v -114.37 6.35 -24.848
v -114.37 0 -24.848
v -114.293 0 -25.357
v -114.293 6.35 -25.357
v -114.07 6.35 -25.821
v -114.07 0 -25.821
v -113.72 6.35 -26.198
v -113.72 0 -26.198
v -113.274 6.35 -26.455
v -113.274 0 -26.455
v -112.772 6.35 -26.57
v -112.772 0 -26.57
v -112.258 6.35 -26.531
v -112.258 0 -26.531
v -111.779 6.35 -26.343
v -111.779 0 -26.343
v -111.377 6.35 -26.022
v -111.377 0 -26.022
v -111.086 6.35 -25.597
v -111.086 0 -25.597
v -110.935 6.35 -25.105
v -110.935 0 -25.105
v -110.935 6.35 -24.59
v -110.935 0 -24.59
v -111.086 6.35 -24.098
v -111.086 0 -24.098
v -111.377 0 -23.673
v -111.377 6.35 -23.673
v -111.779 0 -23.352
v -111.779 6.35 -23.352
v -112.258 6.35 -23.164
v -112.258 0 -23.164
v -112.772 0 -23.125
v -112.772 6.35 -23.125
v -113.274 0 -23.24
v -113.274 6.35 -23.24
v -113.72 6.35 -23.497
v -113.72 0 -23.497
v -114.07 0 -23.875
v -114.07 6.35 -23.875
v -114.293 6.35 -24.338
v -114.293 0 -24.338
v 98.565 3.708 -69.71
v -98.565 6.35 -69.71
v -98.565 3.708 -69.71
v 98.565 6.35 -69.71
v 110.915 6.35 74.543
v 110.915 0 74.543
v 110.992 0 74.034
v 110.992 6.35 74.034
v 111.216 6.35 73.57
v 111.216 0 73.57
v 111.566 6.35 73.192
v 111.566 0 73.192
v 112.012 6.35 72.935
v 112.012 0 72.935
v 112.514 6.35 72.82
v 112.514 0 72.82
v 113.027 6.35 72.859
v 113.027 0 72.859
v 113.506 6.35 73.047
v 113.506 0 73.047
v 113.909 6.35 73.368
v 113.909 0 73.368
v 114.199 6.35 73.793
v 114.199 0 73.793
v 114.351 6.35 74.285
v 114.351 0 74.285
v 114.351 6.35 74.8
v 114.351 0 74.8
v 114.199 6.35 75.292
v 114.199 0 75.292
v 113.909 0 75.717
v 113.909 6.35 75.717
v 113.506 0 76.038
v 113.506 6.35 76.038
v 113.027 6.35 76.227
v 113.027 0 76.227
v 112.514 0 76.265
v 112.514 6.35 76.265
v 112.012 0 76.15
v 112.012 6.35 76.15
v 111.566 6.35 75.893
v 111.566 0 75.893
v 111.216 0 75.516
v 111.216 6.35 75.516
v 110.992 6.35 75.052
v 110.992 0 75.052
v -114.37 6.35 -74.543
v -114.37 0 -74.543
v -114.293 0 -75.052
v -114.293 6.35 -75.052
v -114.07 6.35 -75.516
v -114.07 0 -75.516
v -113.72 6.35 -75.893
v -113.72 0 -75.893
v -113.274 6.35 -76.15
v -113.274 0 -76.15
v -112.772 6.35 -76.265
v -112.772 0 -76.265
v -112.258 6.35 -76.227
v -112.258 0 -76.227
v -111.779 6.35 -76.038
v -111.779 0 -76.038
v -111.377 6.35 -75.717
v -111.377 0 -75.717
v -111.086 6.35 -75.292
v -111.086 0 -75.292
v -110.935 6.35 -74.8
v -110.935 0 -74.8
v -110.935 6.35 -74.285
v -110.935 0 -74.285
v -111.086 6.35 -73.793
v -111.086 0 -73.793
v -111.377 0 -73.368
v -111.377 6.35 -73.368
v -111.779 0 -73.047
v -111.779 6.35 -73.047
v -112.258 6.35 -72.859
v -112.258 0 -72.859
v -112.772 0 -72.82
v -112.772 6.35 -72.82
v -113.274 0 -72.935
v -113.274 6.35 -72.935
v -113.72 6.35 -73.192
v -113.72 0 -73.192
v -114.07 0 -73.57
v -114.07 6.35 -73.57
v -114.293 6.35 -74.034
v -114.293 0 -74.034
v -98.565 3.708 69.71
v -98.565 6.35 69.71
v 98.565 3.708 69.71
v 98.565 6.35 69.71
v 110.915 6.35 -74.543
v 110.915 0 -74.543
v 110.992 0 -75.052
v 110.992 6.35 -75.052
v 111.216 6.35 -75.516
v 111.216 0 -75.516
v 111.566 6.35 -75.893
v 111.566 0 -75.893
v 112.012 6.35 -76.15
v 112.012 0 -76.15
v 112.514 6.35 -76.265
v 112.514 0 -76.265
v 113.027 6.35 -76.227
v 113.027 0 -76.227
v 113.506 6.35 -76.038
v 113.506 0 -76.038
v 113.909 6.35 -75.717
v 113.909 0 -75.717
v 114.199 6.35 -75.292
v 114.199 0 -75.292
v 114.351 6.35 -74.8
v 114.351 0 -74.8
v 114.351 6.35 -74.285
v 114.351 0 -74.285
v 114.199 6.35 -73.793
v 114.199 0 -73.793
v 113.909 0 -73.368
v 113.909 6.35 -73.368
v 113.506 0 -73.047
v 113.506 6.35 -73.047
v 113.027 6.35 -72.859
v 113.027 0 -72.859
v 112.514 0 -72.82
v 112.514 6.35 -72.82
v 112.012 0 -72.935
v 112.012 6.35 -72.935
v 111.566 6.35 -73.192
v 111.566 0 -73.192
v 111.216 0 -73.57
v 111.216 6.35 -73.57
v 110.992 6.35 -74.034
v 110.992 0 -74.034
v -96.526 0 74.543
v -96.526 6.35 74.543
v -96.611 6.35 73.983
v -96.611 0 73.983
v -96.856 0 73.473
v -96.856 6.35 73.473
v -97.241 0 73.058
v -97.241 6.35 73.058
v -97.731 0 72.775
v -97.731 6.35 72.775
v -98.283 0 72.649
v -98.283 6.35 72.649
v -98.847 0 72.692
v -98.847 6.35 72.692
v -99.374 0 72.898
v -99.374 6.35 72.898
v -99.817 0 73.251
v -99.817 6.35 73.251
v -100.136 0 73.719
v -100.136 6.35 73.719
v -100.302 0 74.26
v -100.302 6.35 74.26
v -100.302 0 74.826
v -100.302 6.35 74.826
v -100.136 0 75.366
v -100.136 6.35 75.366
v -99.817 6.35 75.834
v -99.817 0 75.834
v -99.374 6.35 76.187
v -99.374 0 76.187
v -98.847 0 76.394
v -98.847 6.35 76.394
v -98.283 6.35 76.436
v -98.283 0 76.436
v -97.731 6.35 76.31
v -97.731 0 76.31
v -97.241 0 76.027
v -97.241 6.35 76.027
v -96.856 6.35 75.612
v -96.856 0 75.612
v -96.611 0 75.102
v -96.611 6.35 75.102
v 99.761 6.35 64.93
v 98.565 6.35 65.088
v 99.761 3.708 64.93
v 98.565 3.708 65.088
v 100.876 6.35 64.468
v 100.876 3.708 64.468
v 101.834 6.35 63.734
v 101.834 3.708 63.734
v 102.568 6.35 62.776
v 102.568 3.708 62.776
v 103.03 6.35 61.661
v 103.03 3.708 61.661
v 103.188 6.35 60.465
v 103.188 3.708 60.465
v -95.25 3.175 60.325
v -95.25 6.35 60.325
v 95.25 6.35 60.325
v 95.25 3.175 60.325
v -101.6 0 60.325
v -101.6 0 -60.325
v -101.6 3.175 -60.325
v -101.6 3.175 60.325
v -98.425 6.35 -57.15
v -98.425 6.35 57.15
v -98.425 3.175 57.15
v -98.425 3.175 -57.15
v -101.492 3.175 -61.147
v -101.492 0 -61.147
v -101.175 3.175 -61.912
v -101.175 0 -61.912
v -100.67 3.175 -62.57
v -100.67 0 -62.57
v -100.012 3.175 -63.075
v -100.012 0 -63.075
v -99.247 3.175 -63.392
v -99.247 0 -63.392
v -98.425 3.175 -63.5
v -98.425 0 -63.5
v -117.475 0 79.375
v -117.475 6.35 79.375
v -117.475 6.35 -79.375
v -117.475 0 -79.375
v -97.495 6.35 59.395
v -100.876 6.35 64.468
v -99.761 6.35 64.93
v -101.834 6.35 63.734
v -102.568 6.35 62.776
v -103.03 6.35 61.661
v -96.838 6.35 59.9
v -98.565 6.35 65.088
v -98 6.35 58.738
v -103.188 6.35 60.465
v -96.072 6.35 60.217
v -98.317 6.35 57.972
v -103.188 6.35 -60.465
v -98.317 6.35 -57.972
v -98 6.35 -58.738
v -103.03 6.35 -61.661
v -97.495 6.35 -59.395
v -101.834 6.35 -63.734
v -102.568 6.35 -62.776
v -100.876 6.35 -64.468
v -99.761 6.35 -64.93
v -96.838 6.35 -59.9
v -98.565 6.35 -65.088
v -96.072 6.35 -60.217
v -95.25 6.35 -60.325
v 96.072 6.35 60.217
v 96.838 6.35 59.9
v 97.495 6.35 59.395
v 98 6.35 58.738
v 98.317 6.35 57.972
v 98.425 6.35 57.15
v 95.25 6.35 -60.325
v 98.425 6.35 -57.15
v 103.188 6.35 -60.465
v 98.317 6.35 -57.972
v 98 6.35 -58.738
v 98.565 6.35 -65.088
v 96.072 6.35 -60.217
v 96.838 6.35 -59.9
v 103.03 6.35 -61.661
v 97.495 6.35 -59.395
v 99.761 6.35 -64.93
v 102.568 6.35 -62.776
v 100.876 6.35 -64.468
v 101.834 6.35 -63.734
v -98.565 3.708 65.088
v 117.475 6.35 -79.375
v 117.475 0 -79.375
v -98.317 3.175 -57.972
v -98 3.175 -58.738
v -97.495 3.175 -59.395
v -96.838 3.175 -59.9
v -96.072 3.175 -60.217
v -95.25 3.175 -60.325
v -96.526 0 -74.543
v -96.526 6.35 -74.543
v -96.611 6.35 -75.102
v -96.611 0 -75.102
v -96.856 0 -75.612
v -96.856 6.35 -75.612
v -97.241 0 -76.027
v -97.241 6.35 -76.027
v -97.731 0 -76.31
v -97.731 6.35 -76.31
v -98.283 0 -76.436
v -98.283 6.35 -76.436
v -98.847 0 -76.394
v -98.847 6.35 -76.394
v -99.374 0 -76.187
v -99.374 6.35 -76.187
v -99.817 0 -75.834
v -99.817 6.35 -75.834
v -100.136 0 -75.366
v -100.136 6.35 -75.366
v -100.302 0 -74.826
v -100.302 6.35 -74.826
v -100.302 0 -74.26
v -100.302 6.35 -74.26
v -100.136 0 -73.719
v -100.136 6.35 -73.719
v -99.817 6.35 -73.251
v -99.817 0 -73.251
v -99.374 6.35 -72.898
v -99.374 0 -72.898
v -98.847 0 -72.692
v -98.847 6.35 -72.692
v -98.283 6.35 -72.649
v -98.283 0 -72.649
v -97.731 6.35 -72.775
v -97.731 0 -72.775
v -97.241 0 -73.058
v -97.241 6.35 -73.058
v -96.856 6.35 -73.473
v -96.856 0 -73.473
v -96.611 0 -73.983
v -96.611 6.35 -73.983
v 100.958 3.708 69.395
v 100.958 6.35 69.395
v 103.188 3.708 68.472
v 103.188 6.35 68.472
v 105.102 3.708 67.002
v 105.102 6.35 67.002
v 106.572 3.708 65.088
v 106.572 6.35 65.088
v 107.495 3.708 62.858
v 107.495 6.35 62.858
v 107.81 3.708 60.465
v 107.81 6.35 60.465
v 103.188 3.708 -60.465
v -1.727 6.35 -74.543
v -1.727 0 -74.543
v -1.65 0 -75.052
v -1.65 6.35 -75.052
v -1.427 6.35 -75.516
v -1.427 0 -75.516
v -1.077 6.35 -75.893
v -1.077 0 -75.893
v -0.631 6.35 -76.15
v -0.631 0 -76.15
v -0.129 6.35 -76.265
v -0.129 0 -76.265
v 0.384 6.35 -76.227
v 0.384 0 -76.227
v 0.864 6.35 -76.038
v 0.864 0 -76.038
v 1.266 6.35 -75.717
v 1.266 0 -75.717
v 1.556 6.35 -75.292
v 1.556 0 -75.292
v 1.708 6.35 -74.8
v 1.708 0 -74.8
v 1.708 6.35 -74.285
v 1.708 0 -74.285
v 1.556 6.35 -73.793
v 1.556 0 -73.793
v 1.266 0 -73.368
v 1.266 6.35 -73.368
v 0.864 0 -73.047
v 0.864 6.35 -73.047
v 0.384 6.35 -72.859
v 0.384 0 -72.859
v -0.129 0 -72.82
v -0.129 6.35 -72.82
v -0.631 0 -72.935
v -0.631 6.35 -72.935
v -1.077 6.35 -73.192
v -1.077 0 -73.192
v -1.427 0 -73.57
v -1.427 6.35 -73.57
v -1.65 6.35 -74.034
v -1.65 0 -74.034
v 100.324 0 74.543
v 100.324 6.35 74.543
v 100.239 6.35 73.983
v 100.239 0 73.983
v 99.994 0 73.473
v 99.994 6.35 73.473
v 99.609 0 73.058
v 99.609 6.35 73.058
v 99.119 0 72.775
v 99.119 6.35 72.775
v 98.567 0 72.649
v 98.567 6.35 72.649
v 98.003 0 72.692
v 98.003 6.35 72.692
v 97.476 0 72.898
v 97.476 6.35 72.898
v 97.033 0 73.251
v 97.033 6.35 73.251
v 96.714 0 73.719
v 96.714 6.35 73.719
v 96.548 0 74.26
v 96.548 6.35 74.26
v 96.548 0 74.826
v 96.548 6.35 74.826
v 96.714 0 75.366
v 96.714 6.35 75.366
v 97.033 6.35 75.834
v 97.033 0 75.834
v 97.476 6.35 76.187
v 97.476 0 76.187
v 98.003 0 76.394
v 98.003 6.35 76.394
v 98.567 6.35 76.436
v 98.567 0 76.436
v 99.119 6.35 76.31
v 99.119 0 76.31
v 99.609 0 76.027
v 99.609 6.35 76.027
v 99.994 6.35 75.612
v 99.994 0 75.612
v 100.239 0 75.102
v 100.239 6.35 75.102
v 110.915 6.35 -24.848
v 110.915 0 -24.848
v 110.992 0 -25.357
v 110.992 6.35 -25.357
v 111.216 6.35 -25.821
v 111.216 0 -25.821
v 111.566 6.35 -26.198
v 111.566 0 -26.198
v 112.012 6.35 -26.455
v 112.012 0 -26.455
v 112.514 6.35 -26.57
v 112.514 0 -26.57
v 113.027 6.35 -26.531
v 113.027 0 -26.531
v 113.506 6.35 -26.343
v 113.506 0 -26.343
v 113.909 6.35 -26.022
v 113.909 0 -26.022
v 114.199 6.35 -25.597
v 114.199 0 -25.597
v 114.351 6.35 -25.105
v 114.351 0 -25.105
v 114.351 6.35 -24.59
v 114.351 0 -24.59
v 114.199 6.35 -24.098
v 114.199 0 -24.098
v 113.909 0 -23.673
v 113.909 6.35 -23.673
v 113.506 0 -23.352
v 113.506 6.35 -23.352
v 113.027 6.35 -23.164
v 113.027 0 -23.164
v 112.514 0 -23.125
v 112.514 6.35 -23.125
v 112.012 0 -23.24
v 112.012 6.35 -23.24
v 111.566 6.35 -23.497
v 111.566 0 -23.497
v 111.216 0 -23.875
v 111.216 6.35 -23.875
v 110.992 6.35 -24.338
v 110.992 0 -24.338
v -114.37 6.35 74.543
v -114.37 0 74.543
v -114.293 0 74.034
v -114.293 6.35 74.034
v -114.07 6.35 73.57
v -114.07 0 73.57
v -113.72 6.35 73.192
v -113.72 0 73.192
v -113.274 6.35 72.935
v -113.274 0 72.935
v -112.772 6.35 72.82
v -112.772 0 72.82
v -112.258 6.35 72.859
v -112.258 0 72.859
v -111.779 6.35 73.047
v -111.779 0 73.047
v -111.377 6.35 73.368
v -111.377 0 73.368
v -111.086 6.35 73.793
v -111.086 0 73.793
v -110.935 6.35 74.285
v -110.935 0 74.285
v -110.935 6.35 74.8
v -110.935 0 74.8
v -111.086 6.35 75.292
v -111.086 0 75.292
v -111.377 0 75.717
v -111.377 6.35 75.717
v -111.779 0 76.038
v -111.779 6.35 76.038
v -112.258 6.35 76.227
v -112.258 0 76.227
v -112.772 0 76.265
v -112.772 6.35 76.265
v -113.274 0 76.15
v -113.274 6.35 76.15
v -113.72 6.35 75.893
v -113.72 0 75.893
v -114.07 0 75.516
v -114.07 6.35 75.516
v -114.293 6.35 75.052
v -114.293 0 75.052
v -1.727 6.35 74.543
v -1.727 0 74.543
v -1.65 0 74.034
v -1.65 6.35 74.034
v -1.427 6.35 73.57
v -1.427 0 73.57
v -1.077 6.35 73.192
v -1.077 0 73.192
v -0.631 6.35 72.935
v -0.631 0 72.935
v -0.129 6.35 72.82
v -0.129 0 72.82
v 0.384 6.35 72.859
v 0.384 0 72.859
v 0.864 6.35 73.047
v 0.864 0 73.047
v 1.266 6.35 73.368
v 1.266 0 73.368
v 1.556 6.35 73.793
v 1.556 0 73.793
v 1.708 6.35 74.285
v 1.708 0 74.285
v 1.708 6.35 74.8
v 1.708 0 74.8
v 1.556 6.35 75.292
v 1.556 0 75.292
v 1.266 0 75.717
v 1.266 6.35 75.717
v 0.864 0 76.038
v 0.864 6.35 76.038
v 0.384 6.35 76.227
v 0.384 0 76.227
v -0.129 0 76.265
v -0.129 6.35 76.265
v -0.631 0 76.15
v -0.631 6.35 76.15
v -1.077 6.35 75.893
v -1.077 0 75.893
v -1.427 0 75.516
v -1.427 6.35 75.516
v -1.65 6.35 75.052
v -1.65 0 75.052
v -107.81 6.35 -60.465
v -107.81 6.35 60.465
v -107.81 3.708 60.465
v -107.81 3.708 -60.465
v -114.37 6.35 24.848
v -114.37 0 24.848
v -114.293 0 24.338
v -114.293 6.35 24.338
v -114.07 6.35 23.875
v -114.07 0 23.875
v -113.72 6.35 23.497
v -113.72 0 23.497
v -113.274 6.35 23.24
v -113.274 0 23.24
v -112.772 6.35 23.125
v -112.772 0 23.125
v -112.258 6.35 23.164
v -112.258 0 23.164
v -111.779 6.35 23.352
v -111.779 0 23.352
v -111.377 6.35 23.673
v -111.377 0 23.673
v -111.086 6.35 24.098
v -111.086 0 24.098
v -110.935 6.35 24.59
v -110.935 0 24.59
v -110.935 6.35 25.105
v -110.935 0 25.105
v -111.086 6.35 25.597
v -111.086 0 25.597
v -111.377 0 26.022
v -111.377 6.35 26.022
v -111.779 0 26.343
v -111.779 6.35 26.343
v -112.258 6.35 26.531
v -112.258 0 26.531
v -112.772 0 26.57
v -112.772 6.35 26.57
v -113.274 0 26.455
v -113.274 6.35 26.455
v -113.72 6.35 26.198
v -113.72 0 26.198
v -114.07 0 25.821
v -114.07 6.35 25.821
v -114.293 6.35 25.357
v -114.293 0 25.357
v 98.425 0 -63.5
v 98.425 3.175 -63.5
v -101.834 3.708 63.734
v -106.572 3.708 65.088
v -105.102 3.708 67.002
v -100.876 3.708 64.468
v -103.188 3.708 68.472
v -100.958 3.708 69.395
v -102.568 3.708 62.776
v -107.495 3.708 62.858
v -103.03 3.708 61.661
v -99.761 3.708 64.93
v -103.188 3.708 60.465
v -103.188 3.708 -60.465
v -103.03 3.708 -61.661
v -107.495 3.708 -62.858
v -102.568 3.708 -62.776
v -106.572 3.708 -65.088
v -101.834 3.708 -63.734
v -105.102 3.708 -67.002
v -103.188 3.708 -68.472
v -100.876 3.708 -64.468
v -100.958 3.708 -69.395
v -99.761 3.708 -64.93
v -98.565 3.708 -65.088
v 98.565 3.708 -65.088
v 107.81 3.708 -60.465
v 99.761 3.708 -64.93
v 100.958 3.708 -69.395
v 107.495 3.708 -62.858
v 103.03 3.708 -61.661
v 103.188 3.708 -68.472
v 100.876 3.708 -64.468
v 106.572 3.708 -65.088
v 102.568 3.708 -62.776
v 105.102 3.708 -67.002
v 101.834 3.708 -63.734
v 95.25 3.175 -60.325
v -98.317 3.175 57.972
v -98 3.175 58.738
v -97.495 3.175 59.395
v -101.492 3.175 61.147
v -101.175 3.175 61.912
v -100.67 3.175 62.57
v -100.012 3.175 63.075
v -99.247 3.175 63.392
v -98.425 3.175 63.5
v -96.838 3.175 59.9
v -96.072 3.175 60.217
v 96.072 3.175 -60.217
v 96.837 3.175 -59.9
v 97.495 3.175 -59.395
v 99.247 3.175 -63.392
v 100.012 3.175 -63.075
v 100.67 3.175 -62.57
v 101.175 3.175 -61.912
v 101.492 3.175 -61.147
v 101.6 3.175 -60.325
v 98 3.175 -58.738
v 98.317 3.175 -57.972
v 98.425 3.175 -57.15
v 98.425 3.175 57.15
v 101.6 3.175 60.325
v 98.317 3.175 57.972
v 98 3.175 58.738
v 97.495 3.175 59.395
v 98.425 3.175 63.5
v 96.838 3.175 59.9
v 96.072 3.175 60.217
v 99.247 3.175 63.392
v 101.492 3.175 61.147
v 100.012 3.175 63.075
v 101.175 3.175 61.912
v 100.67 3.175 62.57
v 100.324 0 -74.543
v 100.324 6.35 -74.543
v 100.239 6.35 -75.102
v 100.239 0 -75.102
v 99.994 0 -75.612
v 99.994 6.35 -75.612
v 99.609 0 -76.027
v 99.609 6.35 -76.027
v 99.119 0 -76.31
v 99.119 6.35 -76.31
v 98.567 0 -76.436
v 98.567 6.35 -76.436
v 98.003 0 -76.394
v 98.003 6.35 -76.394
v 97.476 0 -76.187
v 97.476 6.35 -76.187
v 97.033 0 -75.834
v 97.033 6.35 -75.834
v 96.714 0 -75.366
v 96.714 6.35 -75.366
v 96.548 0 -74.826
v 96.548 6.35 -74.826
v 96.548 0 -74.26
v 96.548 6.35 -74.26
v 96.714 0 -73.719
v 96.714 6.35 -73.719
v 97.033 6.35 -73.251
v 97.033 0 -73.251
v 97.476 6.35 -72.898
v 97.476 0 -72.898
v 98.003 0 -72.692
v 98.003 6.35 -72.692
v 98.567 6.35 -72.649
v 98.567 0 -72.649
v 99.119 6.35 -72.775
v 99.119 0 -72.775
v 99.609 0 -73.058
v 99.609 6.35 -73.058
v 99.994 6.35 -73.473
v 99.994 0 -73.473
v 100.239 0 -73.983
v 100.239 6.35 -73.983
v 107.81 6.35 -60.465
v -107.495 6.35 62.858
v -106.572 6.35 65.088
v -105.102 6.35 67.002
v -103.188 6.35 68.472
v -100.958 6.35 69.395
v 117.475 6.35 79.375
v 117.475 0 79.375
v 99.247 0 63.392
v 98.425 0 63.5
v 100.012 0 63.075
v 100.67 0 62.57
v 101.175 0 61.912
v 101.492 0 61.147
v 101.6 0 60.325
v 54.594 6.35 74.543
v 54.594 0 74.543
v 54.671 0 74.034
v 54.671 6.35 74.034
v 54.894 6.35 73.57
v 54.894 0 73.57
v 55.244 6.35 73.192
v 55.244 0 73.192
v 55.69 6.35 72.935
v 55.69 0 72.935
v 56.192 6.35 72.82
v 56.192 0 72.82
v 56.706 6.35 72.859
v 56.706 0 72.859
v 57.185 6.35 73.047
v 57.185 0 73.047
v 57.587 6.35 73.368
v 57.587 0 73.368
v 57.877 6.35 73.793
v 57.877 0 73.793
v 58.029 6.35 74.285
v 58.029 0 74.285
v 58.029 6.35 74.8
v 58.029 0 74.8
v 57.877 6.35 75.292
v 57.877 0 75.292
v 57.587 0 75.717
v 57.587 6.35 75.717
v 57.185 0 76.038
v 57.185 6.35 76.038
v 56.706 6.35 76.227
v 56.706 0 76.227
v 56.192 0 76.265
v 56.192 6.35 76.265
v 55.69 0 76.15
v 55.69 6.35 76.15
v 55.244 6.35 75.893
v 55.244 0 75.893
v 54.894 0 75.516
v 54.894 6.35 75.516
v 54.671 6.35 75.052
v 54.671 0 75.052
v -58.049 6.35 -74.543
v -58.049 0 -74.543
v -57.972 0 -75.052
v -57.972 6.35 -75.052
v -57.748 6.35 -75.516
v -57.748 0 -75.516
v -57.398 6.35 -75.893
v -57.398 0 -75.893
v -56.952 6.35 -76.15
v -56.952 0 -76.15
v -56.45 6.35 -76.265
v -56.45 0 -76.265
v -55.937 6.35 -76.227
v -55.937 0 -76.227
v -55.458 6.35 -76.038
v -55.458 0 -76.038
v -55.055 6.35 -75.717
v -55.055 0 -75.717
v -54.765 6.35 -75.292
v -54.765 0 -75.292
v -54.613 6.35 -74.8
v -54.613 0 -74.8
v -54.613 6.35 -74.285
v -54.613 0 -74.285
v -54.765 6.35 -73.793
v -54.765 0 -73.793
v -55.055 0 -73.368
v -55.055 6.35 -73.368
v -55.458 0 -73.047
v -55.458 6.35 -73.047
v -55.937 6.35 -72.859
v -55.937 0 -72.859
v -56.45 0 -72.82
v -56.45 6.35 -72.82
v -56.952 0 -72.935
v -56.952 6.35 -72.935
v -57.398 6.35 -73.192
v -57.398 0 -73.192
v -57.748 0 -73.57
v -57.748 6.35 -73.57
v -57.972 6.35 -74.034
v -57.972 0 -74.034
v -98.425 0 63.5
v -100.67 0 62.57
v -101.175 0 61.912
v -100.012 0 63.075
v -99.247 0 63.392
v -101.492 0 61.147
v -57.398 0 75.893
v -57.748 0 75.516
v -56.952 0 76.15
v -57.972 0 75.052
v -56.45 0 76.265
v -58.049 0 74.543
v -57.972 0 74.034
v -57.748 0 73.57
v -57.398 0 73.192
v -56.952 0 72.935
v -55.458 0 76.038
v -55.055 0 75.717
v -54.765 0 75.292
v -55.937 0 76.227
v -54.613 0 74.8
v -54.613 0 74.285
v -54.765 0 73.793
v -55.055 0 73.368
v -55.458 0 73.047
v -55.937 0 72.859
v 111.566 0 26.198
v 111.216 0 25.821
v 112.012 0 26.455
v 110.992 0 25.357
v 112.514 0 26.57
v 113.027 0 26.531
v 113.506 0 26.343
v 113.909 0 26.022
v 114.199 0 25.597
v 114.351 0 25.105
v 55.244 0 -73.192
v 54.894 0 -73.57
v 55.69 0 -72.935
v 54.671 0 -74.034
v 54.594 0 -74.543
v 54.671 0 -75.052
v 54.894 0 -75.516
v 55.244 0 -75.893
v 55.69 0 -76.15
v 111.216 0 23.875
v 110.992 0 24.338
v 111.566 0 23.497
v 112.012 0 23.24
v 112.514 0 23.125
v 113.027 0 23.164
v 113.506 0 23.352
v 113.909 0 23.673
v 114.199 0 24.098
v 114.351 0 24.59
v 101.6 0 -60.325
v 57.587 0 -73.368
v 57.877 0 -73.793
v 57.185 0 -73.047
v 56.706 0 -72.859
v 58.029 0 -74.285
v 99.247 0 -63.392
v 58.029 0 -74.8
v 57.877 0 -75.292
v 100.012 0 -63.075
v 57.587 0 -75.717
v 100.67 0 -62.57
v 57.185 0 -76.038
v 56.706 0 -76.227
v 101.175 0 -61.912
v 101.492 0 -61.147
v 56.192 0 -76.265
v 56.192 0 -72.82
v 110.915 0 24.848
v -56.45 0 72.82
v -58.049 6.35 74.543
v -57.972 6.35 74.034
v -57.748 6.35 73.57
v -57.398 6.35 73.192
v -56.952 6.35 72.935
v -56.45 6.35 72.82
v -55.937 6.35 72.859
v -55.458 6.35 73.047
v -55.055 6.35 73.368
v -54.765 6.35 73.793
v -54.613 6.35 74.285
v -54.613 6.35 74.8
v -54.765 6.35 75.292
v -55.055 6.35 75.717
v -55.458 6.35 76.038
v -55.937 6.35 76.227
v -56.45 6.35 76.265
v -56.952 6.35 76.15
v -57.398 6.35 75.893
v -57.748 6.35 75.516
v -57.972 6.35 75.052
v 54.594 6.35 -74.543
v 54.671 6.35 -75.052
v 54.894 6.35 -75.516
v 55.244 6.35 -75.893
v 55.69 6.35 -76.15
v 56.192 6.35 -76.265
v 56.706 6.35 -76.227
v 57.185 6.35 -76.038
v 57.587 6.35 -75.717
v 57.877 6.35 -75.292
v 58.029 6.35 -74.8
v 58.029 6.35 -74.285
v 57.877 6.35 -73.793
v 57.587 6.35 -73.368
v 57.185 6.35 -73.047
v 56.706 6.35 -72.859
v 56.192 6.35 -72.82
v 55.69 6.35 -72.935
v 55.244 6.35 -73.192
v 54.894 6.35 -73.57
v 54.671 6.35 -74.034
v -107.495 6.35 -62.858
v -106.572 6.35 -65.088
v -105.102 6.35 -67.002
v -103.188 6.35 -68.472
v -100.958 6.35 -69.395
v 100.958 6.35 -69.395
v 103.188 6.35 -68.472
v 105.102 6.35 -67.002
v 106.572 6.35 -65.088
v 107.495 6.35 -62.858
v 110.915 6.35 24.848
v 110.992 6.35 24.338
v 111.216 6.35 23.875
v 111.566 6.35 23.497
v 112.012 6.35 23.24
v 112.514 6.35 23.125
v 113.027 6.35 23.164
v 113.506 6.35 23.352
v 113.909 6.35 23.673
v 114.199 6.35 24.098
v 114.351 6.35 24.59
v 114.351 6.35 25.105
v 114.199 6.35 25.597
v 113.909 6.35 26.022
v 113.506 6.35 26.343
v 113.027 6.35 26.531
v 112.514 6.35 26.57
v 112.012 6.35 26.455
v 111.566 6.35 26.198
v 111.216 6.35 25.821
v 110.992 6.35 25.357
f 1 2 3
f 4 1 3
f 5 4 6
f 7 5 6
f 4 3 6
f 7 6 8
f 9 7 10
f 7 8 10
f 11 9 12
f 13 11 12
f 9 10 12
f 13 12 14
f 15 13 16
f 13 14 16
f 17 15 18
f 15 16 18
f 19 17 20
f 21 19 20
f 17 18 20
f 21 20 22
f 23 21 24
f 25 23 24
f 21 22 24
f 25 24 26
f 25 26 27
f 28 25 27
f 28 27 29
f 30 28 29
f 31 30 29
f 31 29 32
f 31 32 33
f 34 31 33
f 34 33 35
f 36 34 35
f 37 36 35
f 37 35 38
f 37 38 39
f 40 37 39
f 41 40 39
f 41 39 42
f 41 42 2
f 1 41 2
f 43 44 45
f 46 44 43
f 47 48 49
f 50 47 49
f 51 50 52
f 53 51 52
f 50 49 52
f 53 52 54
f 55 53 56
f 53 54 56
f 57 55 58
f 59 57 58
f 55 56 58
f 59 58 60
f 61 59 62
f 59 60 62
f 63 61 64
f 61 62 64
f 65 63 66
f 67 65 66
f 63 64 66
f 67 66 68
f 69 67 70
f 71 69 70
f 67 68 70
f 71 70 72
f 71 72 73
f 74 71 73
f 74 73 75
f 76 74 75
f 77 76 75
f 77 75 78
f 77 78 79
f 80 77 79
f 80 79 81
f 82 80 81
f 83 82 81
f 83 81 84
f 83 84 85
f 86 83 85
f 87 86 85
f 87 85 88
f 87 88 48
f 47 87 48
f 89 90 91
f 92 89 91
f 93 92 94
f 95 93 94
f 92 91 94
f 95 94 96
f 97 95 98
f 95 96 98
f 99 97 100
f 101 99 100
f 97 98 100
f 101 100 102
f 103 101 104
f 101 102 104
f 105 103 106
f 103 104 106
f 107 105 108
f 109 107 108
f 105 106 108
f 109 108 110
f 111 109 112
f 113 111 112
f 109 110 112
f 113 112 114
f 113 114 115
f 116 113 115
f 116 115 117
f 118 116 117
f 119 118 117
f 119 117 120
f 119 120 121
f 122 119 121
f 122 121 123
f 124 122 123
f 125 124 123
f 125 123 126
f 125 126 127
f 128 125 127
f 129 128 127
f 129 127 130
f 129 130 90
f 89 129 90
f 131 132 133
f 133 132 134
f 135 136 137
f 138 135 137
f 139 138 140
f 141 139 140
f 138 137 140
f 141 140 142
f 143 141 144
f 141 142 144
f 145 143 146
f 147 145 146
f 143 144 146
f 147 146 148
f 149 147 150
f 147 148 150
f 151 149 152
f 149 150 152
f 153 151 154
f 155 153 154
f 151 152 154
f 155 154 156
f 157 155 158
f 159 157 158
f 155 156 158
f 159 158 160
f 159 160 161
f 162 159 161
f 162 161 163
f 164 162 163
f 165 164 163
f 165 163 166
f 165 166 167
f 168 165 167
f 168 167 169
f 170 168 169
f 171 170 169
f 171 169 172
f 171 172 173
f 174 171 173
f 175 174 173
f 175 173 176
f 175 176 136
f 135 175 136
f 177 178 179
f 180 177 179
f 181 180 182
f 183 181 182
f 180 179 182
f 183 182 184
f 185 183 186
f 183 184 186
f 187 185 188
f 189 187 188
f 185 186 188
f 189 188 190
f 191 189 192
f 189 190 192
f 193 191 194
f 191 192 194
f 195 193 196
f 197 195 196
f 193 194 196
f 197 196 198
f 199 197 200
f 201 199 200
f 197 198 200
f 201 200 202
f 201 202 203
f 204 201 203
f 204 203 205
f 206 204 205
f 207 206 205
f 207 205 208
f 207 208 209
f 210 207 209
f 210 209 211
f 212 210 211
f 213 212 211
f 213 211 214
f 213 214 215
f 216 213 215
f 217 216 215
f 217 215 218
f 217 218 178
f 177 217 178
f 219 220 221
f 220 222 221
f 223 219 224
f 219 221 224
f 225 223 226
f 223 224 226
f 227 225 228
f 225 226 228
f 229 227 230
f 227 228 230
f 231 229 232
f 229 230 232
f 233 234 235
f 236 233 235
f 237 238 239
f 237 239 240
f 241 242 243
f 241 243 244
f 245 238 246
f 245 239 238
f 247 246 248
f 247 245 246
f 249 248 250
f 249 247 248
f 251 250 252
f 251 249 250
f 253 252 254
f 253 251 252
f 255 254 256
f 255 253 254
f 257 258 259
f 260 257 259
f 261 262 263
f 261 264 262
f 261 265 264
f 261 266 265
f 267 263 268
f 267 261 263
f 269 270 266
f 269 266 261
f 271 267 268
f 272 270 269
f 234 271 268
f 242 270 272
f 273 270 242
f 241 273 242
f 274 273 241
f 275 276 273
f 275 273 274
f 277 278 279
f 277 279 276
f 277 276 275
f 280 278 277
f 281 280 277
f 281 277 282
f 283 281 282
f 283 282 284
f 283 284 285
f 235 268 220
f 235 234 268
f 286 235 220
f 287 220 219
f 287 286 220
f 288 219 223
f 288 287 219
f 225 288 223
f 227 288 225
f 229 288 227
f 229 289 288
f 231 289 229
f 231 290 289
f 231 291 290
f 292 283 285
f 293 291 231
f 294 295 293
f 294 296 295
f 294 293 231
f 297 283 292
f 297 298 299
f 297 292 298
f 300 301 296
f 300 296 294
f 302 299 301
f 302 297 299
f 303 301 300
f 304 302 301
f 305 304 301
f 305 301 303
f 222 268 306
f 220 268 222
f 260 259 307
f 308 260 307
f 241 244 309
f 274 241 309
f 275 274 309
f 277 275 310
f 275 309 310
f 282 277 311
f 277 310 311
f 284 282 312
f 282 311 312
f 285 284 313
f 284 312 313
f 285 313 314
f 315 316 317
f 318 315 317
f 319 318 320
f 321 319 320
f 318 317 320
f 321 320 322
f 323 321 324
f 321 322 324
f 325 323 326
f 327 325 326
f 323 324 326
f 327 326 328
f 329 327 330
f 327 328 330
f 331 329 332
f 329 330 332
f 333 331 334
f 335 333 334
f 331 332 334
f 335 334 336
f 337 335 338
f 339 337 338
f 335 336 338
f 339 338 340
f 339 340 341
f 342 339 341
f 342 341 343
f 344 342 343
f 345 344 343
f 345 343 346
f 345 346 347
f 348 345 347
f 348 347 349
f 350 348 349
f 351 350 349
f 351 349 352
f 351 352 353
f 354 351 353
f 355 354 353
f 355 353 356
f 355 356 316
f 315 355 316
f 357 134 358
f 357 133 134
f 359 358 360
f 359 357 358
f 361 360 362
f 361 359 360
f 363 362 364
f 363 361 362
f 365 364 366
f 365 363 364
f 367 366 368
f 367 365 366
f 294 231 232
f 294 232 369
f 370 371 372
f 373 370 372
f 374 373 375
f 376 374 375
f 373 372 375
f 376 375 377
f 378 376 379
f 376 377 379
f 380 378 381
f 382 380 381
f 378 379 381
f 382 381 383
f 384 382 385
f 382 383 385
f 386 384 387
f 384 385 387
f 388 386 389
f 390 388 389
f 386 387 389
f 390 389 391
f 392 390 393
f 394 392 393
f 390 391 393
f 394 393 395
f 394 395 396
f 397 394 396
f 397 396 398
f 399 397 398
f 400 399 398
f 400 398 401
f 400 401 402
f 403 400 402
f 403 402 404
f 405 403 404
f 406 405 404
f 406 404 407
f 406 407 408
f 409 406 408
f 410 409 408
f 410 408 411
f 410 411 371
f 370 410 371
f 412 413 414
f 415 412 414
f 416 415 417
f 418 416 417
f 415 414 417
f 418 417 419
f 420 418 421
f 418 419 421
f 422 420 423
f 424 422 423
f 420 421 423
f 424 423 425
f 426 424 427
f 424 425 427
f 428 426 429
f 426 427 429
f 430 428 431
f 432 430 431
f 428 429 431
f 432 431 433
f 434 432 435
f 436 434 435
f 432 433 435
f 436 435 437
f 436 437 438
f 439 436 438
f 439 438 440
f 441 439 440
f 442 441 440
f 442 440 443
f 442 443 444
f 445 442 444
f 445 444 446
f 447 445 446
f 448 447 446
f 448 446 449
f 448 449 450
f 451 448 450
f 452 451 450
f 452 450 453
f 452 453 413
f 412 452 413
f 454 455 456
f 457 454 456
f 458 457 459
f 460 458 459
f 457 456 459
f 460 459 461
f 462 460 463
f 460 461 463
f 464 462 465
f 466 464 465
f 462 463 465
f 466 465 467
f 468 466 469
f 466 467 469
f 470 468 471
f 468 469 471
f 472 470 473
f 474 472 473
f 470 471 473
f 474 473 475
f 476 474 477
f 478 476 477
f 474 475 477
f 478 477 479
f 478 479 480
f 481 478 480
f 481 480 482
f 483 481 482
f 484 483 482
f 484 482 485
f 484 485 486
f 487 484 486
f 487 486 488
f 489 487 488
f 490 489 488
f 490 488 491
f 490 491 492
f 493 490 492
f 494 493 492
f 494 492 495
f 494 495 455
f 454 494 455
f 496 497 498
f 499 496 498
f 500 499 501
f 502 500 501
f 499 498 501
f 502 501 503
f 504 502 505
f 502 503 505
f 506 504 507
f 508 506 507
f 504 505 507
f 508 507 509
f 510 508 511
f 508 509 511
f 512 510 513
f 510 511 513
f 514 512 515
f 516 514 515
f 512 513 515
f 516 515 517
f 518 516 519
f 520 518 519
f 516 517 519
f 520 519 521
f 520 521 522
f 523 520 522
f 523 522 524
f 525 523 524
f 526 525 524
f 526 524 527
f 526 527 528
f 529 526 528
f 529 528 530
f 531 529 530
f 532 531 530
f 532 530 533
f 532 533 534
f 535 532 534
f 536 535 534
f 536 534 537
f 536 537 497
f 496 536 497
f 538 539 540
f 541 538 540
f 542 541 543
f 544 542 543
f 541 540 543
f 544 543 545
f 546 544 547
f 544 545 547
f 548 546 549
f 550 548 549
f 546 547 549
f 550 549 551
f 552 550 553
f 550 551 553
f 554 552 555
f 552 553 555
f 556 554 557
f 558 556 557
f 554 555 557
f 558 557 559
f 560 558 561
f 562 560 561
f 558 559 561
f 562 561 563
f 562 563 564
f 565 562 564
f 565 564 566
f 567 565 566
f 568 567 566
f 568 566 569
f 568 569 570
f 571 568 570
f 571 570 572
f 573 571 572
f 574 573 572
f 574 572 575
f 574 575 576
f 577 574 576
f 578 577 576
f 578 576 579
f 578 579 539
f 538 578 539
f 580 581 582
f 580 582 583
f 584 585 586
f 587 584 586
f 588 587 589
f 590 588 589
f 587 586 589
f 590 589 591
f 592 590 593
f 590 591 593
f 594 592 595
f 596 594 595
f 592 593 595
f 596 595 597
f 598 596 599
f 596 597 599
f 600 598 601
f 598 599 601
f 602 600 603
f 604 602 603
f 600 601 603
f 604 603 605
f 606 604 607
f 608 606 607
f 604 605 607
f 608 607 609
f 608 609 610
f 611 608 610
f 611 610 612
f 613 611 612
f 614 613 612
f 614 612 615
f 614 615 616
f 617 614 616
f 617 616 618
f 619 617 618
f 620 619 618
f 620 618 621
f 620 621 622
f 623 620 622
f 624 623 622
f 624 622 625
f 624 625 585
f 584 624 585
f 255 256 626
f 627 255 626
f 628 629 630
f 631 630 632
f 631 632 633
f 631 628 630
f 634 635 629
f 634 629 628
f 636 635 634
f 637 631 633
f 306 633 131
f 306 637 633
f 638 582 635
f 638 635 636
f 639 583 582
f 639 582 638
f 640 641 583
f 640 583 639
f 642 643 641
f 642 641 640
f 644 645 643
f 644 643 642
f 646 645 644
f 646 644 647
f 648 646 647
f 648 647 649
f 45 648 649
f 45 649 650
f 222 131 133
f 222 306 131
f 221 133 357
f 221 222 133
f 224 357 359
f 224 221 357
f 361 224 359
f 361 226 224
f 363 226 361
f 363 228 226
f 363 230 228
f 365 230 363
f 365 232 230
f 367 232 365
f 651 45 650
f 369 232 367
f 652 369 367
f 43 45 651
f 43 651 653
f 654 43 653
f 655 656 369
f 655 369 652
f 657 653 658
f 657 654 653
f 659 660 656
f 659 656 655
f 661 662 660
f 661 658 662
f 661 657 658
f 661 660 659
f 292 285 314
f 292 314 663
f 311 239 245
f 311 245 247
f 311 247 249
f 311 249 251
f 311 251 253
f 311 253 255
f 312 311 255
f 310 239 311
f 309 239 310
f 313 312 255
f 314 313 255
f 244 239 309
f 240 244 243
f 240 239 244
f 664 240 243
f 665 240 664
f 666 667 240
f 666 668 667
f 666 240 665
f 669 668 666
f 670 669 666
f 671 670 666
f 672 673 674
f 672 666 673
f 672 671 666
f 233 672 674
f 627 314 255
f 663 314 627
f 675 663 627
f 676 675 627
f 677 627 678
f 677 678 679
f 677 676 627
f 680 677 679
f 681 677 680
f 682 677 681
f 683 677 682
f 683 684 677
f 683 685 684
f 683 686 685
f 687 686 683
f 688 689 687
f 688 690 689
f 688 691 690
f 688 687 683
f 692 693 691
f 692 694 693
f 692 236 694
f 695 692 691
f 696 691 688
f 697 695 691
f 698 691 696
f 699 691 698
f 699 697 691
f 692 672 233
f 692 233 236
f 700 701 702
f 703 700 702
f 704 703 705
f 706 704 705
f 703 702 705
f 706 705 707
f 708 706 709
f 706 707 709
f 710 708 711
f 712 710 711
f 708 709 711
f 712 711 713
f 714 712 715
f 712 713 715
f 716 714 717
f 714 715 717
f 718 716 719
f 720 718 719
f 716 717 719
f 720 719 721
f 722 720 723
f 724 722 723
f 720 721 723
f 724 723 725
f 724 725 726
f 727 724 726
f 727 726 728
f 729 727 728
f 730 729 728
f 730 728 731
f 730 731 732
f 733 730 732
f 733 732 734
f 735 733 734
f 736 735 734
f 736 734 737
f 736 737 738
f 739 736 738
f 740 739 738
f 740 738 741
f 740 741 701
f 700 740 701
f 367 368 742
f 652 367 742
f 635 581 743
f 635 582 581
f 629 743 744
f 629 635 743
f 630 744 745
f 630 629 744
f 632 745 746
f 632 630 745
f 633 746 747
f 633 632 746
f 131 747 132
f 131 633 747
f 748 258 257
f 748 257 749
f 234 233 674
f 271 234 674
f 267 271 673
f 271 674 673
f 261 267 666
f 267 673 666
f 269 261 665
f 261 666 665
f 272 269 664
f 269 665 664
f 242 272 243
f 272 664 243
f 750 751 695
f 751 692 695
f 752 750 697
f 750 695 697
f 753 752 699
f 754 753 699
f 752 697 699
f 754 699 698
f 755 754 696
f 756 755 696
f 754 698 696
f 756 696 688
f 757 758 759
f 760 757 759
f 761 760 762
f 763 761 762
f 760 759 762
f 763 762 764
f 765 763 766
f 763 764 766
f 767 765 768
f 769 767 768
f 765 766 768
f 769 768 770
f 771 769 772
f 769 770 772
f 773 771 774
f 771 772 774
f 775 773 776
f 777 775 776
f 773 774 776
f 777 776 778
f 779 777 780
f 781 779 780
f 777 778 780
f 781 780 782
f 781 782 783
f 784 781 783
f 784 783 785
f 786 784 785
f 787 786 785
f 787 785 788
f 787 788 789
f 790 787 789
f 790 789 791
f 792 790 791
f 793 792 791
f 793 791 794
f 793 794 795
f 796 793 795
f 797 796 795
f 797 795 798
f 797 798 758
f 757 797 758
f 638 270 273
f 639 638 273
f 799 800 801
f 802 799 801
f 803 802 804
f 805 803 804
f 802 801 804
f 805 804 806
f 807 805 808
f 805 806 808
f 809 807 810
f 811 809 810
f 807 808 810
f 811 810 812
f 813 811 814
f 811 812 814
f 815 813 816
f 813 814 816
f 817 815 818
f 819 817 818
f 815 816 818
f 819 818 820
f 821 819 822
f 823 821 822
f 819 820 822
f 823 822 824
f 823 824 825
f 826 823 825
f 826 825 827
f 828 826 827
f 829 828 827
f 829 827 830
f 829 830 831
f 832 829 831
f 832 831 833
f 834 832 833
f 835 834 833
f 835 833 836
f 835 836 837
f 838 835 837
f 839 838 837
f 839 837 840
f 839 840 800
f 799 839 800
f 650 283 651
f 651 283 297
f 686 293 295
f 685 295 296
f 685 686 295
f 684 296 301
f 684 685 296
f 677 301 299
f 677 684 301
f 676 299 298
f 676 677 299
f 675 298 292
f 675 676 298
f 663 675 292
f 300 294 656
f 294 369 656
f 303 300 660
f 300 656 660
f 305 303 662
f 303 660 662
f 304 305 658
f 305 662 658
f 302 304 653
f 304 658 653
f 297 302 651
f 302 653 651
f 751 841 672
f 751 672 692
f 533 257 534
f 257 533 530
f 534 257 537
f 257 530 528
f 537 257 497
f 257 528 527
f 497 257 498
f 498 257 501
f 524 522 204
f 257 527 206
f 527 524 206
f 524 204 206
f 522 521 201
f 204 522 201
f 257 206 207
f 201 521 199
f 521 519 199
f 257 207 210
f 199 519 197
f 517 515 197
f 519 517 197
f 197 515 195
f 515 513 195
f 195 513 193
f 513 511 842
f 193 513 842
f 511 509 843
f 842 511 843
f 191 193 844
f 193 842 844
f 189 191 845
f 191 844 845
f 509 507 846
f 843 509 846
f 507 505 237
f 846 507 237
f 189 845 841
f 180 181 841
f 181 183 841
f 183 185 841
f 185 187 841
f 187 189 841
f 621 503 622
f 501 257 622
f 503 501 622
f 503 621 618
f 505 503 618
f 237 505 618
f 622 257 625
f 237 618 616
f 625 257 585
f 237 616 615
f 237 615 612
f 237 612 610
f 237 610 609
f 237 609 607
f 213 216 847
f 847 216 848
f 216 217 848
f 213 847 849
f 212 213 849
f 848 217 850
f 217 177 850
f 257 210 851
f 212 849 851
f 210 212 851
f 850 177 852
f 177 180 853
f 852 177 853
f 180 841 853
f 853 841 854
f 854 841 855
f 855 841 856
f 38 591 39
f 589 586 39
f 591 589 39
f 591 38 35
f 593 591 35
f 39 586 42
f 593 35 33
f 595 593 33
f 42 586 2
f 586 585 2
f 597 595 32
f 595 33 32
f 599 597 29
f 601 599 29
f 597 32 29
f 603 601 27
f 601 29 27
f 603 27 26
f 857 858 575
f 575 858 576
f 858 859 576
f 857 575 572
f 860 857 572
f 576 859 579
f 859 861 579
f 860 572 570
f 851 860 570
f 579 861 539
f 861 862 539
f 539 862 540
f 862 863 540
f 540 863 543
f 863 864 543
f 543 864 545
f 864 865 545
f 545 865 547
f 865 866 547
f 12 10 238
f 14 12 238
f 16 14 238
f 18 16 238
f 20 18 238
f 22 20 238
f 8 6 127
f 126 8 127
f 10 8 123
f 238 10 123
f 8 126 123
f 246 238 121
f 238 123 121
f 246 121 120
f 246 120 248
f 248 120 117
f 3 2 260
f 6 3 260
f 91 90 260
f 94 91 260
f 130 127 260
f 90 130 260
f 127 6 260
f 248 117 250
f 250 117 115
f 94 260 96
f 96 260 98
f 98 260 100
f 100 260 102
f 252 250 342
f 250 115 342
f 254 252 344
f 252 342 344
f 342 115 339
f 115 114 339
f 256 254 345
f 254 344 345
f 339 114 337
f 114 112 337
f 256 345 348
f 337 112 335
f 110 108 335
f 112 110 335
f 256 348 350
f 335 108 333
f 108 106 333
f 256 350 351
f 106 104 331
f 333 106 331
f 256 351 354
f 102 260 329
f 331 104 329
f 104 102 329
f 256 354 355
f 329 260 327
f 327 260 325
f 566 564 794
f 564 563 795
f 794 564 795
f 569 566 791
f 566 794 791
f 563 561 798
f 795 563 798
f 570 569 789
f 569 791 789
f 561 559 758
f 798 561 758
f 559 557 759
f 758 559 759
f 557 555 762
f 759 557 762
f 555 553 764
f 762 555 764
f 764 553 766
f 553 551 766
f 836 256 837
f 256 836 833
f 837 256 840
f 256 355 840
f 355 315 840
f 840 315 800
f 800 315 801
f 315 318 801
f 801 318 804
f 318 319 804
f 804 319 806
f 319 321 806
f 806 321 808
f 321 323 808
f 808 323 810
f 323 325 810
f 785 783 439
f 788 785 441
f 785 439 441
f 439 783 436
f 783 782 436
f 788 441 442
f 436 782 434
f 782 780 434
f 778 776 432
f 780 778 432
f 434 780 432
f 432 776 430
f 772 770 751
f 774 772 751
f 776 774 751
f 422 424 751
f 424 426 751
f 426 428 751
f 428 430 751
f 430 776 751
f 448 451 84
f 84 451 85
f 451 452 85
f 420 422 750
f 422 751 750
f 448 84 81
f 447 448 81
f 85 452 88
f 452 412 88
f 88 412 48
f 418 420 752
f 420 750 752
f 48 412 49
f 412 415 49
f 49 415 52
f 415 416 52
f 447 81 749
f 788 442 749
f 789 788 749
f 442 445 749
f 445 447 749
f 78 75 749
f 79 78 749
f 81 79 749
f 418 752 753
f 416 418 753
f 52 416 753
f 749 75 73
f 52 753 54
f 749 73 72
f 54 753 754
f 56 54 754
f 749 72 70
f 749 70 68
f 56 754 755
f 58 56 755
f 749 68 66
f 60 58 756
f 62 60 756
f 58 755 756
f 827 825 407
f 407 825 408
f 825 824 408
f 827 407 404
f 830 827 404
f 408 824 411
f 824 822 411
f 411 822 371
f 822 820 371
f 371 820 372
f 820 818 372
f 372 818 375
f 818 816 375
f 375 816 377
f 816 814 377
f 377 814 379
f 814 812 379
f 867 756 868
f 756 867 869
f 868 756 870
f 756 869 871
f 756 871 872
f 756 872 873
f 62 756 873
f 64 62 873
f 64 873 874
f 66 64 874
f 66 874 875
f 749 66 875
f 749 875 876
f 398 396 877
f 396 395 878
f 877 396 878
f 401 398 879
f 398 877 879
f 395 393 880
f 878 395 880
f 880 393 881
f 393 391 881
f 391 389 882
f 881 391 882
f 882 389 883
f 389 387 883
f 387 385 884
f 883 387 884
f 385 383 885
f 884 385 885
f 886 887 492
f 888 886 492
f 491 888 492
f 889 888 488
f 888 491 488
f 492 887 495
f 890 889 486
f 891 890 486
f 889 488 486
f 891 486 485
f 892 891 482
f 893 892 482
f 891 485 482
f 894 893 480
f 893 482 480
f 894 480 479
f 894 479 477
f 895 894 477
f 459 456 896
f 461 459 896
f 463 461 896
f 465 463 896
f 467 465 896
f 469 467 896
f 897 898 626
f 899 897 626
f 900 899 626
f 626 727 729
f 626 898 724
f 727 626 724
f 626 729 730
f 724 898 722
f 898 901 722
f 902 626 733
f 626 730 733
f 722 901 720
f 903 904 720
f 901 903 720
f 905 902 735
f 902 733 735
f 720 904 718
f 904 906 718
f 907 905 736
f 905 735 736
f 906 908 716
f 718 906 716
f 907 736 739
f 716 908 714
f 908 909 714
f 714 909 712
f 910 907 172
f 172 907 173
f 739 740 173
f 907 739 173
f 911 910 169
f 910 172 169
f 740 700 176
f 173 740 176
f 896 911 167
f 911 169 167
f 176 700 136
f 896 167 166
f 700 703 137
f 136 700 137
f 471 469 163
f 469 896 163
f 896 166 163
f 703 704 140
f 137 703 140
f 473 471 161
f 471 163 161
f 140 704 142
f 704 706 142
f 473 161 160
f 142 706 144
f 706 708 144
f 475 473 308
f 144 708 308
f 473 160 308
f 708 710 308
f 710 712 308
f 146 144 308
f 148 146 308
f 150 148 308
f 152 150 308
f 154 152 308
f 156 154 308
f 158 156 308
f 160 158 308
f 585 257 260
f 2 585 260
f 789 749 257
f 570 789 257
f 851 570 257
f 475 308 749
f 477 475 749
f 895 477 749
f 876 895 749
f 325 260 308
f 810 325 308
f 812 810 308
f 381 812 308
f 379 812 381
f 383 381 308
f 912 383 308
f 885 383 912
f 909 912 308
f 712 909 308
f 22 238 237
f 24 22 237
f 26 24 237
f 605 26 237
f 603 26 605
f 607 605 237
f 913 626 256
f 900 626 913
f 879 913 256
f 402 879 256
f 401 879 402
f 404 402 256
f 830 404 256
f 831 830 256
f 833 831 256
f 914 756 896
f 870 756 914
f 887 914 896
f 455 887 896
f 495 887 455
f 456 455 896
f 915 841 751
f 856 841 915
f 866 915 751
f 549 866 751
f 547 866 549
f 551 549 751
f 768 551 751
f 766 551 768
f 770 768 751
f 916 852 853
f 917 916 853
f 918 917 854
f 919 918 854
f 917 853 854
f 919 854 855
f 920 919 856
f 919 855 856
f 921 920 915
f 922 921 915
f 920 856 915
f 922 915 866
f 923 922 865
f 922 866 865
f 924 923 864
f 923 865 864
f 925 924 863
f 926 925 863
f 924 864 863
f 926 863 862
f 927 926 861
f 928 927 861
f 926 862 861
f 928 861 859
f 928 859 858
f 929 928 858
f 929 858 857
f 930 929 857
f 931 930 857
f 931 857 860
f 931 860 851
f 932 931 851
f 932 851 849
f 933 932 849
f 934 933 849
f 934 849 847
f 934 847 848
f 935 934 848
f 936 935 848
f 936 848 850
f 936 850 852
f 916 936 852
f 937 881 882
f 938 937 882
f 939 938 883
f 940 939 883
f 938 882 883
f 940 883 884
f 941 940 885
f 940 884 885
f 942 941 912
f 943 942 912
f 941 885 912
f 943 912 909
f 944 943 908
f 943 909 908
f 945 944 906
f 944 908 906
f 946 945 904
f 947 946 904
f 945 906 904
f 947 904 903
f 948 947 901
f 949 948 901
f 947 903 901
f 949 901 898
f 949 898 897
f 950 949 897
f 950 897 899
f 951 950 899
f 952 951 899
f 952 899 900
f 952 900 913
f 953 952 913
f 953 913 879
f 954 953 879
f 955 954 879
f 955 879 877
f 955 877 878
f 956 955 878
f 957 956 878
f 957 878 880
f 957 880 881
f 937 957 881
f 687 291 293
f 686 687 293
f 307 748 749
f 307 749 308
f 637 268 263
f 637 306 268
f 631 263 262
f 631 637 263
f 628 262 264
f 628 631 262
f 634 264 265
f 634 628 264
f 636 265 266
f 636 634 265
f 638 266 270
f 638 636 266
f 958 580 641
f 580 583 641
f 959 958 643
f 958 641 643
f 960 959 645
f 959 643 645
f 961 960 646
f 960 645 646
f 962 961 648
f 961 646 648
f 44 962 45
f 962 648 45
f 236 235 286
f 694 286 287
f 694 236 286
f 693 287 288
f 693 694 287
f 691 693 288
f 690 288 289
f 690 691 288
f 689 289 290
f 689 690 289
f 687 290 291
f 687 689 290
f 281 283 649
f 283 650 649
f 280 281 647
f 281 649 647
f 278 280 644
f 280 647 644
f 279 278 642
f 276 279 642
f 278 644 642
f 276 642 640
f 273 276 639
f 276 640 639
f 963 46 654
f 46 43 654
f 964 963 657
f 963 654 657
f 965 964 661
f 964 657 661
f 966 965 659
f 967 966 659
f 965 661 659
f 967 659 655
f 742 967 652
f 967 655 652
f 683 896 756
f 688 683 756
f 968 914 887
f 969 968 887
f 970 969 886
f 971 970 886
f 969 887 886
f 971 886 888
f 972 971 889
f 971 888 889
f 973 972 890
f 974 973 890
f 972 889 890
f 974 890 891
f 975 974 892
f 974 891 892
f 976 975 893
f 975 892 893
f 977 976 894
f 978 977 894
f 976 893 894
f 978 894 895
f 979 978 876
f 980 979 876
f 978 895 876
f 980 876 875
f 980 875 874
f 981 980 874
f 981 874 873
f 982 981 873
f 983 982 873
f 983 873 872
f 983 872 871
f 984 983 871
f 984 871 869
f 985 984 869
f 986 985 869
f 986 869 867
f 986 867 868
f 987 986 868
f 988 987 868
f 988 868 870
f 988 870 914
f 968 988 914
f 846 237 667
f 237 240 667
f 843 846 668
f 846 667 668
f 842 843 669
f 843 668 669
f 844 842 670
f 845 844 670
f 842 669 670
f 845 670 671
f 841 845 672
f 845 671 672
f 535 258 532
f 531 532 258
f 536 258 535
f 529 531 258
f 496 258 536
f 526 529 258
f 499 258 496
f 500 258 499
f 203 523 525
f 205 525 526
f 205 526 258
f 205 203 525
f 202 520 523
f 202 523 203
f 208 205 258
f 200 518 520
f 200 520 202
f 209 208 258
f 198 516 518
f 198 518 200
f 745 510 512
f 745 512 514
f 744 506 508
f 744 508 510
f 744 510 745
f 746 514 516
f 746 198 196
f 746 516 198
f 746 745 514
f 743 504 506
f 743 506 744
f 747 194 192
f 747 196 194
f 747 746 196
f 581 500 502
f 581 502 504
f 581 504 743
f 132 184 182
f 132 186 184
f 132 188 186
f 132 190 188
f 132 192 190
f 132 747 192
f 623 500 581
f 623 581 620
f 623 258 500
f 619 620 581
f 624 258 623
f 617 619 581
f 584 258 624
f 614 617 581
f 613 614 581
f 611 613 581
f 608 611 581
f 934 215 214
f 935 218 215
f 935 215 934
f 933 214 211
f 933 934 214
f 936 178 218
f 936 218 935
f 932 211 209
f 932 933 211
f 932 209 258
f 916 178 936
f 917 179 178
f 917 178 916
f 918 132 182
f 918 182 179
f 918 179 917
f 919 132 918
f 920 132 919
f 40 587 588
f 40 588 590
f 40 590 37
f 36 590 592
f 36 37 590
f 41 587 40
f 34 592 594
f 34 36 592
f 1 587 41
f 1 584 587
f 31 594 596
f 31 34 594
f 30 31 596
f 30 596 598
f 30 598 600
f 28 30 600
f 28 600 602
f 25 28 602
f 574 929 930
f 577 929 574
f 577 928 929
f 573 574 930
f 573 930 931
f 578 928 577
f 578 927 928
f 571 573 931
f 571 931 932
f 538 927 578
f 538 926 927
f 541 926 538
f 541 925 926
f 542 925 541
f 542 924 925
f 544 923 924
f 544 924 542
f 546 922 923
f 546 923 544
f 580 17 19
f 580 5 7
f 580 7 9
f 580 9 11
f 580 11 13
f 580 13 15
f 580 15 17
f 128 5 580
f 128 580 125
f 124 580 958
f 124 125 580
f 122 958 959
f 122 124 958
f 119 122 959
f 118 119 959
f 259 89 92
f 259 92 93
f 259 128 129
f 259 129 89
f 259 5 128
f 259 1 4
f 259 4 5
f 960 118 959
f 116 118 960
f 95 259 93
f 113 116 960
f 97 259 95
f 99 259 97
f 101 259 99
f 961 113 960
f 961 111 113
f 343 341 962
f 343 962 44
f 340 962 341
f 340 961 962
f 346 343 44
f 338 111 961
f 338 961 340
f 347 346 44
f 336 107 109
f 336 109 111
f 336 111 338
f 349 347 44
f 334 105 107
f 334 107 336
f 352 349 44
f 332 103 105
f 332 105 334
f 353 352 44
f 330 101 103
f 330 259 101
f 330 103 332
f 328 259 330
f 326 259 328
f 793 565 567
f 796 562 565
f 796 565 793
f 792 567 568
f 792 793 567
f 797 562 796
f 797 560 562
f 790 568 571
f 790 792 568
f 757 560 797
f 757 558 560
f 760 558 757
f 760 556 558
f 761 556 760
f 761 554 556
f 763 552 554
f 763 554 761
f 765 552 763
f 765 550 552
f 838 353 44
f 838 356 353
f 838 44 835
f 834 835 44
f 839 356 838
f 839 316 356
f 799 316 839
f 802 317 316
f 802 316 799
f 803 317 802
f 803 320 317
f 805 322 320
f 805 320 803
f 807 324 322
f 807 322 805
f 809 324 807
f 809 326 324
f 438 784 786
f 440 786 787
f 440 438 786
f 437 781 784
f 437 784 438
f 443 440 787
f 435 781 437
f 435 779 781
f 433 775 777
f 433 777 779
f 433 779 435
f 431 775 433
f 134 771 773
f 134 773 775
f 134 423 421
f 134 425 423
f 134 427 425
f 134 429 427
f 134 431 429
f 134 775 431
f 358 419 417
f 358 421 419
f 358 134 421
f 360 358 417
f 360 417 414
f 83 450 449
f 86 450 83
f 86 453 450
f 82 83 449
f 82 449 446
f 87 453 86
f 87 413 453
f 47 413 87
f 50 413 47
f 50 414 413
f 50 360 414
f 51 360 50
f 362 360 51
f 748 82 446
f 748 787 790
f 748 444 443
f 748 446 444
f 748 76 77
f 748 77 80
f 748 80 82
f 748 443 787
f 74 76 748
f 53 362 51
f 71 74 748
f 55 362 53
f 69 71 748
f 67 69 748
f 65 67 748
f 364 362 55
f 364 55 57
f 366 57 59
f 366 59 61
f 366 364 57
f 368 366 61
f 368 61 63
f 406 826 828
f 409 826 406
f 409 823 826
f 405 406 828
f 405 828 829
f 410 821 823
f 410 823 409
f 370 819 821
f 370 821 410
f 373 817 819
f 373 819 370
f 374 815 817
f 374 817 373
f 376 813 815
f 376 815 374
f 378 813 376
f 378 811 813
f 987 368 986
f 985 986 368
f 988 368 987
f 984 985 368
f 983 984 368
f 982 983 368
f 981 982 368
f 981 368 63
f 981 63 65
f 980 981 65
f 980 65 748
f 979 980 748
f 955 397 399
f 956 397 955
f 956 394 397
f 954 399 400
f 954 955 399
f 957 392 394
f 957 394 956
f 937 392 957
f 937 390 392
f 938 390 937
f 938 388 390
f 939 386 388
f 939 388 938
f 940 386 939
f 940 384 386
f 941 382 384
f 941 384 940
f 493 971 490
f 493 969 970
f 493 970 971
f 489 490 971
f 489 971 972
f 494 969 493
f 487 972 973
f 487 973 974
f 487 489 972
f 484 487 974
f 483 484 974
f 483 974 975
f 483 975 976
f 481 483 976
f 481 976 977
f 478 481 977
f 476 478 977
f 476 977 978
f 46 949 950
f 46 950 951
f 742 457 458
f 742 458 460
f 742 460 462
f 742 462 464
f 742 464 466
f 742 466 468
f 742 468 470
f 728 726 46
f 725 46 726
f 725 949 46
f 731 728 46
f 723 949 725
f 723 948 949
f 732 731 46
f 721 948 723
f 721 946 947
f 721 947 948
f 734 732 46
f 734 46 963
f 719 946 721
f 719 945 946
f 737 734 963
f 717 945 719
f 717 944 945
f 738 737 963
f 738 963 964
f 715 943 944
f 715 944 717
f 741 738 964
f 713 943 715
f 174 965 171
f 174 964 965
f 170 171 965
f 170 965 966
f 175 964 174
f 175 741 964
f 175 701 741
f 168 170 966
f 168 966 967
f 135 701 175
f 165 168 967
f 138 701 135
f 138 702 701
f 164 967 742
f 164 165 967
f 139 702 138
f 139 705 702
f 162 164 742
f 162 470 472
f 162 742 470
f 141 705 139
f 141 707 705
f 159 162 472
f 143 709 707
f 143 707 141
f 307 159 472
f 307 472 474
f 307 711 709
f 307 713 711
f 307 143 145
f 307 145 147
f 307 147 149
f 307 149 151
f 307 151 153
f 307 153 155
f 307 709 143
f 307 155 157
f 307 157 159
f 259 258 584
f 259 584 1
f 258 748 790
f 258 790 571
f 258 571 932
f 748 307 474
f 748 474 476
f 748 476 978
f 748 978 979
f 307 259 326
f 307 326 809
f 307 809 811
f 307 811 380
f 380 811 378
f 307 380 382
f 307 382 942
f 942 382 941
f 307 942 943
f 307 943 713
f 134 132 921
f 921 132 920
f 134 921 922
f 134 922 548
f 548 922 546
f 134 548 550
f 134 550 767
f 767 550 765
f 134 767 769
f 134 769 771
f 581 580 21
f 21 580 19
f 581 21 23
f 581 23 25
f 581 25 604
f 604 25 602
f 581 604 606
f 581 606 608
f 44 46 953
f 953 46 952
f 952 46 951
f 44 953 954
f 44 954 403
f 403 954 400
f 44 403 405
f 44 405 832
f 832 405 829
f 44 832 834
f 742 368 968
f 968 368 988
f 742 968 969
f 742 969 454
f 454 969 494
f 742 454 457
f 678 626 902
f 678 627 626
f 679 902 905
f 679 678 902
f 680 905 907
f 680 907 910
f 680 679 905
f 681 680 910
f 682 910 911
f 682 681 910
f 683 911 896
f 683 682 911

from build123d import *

# Parameters (mm, degrees)
SKETCH1_W             = 203.2
SKETCH1_H             = 127
BOSS_EXTRUDE1_DEPTH   = 6.35
SKETCH2_W             = 196.85
SKETCH2_H             = 120.65
CUT_EXTRUDE1_DEPTH    = 7.35
SKETCH4_W             = 234.95
SKETCH4_H             = 158.75
SKETCH4_W_2           = 203.2
SKETCH4_H_2           = 127
BOSS_EXTRUDE2_DEPTH   = 6.35
SKETCH7_W             = 215.6206
SKETCH7_H             = 139.4206
SKETCH7_W_2           = 206.375
SKETCH7_H_2           = 130.175
CUT_EXTRUDE2_DEPTH    = 2.6416
F_8_32_TAPPED_HOLE1_D = 3.4544
FILLET3_R             = 4.6228
FILLET4_R             = 9.2456
FILLET5_R             = 3.175
F_6_CLEARANCE_HOLE1_D = 3.7973
SKETCH18_W            = 203.2
SKETCH18_H            = 127
CUT_EXTRUDE3_DEPTH    = 3.175
FILLET6_R             = 3.175


with BuildPart() as part:
    # Sketch1 → Boss-Extrude1 (new body)
    with BuildSketch(Plane(origin=(0, 0, 0), x_dir=(1, 0, 0), z_dir=(0, 1, 0))):
        Rectangle(SKETCH1_W, SKETCH1_H)
    extrude(amount=BOSS_EXTRUDE1_DEPTH)

    # Sketch2 → Cut-Extrude1 (cut, through all)
    with BuildSketch(Plane(origin=(0, 6.35, 0), x_dir=(1, 0, 0), z_dir=(0, 1, 0))):
        Rectangle(SKETCH2_W, SKETCH2_H)
    extrude(amount=-CUT_EXTRUDE1_DEPTH, mode=Mode.SUBTRACT)

    # Sketch4 → Boss-Extrude2 (add)
    with BuildSketch(Plane(origin=(0, 6.35, 0), x_dir=(1, 0, 0), z_dir=(0, 1, 0))):
        Rectangle(SKETCH4_W, SKETCH4_H)
        Rectangle(SKETCH4_W_2, SKETCH4_H_2, mode=Mode.SUBTRACT)
    extrude(amount=-BOSS_EXTRUDE2_DEPTH)

    # Sketch7 → Cut-Extrude2 (cut)
    with BuildSketch(Plane(origin=(0, 6.35, 0), x_dir=(1, 0, 0), z_dir=(0, 1, 0))):
        Rectangle(SKETCH7_W, SKETCH7_H)
        Rectangle(SKETCH7_W_2, SKETCH7_H_2, mode=Mode.SUBTRACT)
    extrude(amount=-CUT_EXTRUDE2_DEPTH, mode=Mode.SUBTRACT)

    # #8-32 Tapped Hole1 (through all)
    with Locations(Plane(origin=(0, 6.35, 0), x_dir=(1, 0, 0), z_dir=(0, 1, 0))):
        with Locations((56.321325, 74.54265), (112.64265, 74.54265), (112.64265, 24.84755), (0, 74.54265), (112.64265, -24.84755), (112.64265, -74.54265), (56.321325, -74.54265), (0, -74.54265), (-56.321325, -74.54265), (-112.64265, -74.54265), (-112.64265, -24.84755), (-112.64265, 24.84755), (-112.64265, 74.54265), (-56.321325, 74.54265)):
            Hole(F_8_32_TAPPED_HOLE1_D / 2)

    # Fillet3
    fillet3_edges = [part.edges().sort_by_distance(p)[0] for p in [
        (-103.1875, 5.0292, -65.0875),
        (103.1875, 5.0292, -65.0875),
        (103.1875, 5.0292, 65.0875),
        (-103.1875, 5.0292, 65.0875),
    ]]
    fillet(fillet3_edges, radius=FILLET3_R)

    # Fillet4
    fillet4_edges = [part.edges().sort_by_distance(p)[0] for p in [
        (-107.8103, 5.0292, -69.7103),
        (107.8103, 5.0292, -69.7103),
        (107.8103, 5.0292, 69.7103),
        (-107.8103, 5.0292, 69.7103),
    ]]
    fillet(fillet4_edges, radius=FILLET4_R)

    # Fillet5
    fillet5_edges = [part.edges().sort_by_distance(p)[0] for p in [
        (-98.425, 3.175, -60.325),
        (98.425, 3.175, -60.325),
        (98.425, 3.175, 60.325),
        (-98.425, 3.175, 60.325),
    ]]
    fillet(fillet5_edges, radius=FILLET5_R)

    # #6 Clearance Hole1 (through all)
    with Locations(Plane(origin=(0, 0, 0), x_dir=(-1, 0, 0), z_dir=(0, -1, 0))):
        with Locations((-98.425, 74.54265), (-98.425, -74.54265), (98.425, -74.54265), (98.425, 74.54265)):
            Hole(F_6_CLEARANCE_HOLE1_D / 2)

    # Sketch18 → Cut-Extrude3 (cut)
    with BuildSketch(Plane.XZ):
        Rectangle(SKETCH18_W, SKETCH18_H)
    extrude(amount=-CUT_EXTRUDE3_DEPTH, mode=Mode.SUBTRACT)

    # Fillet6
    fillet6_edges = [part.edges().sort_by_distance(p)[0] for p in [
        (-101.6, 1.5875, -63.5),
        (-101.6, 1.5875, 63.5),
        (101.6, 1.5875, 63.5),
        (101.6, 1.5875, -63.5),
    ]]
    fillet(fillet6_edges, radius=FILLET6_R)


solid = part.part
